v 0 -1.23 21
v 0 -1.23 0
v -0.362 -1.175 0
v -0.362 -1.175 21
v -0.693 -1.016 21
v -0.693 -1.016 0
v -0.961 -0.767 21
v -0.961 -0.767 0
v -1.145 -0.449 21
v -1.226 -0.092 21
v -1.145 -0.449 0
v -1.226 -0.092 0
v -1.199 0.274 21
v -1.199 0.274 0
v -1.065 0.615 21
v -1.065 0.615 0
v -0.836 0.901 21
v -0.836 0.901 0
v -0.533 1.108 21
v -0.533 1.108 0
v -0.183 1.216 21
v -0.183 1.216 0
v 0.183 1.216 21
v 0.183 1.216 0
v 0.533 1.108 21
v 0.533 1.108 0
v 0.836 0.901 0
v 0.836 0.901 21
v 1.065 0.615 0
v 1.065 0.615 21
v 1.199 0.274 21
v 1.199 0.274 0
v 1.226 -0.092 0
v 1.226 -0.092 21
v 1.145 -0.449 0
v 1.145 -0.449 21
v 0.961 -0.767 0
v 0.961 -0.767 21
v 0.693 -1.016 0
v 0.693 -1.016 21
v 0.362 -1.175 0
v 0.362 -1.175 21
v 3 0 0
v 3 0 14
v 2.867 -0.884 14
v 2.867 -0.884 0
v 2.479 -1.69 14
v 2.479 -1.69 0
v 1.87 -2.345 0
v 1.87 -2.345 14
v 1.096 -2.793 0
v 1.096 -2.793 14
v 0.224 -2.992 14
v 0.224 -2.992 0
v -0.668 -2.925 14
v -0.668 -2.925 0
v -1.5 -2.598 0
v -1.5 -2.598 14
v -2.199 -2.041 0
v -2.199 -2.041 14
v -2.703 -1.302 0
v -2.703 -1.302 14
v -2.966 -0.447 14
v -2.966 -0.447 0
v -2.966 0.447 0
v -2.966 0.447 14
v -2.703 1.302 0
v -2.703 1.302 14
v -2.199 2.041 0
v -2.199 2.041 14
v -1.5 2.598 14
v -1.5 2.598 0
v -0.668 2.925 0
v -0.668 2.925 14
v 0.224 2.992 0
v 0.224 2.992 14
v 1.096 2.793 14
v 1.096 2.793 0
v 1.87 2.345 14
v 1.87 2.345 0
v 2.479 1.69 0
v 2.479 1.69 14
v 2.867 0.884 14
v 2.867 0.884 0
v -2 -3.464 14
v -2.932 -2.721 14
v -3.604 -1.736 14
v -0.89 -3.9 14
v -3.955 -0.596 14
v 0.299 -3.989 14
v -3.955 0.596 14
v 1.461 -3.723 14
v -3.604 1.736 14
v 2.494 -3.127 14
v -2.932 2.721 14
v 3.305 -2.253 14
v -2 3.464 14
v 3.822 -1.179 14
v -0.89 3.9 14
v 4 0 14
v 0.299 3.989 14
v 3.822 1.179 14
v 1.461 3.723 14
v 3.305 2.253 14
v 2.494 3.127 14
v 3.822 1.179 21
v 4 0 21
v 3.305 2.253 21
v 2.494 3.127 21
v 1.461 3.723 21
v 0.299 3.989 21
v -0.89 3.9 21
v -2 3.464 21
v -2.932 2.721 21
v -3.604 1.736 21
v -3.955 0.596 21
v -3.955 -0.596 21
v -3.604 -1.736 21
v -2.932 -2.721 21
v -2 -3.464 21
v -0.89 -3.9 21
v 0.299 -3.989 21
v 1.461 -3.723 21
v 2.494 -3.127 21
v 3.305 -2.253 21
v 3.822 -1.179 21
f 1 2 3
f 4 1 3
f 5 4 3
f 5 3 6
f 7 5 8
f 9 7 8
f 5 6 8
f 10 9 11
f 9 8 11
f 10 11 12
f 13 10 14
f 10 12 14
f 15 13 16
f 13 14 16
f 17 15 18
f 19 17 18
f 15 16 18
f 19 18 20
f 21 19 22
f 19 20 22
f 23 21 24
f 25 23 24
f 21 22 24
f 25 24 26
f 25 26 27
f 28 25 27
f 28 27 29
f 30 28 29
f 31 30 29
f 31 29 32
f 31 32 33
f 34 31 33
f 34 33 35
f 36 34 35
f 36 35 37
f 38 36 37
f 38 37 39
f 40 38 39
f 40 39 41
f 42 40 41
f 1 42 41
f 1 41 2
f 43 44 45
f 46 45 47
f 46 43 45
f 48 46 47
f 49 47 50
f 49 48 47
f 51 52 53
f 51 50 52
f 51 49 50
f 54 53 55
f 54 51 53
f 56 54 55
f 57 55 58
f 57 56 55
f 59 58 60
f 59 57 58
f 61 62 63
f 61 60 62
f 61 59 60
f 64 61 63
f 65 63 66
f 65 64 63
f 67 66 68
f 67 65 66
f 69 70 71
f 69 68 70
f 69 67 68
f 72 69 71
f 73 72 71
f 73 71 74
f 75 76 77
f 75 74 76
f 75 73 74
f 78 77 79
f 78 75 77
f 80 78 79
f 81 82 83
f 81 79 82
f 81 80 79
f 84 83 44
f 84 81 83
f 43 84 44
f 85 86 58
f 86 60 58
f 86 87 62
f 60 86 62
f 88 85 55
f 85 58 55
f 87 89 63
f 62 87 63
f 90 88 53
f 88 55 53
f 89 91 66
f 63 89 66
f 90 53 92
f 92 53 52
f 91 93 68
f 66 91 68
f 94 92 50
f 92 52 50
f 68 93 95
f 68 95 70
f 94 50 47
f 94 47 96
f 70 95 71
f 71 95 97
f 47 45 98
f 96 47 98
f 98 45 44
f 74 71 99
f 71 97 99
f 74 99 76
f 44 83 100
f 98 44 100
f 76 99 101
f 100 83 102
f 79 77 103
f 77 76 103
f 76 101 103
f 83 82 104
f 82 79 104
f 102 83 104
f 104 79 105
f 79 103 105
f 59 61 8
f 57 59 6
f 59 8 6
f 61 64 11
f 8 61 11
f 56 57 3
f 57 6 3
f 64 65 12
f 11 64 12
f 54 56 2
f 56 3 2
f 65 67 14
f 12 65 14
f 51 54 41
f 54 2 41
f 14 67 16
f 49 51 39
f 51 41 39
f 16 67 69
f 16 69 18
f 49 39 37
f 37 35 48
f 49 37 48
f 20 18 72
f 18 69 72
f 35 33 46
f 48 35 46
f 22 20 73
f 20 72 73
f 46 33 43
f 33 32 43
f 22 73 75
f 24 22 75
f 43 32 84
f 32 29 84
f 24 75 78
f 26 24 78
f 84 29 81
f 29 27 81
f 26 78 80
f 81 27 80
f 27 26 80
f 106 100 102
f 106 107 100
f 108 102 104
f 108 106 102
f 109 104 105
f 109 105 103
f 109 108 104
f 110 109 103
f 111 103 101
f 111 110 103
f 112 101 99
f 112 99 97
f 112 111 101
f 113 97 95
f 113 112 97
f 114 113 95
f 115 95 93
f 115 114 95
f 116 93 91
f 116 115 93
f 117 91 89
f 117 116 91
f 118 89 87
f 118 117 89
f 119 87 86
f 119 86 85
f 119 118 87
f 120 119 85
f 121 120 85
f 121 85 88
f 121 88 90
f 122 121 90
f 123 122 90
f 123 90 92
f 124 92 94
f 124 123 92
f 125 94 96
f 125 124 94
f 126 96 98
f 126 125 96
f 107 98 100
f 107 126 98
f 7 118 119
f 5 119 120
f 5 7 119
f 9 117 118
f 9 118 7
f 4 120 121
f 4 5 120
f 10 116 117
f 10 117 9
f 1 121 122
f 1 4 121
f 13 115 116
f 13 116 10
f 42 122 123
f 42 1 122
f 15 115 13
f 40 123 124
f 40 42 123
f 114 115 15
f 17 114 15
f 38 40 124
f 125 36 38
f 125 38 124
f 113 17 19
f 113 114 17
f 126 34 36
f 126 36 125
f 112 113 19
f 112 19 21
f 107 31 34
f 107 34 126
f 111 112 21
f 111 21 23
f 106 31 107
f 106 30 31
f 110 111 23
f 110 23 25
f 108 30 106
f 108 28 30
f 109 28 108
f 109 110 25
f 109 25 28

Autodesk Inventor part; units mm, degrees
ref_plane "YZ Plane" through (0, 0, 0) normal (1, 0, 0) x (0, 1, 0)
ref_plane "XZ Plane" through (0, 0, 0) normal (0, 1, 0) x (-1, 0, 0)
ref_plane "XY Plane" through (0, 0, 0) normal (0, 0, 1) x (1, 0, 0)
sketch "Skizze1" plane through (0, 0, 0) normal (0, 0, 1) x (1, 0, 0)
  circle A0 centre (0, 0) radius 3
  dimension "d0" = 6
extrude "Extrusion1" add sketch "Skizze1" along normal blind 21
hole "Bohrung1" at (0, 0, 21) direction (0, 0, -1) diameter 2.459 end through all thread size "M3x0.5" class "6H" standard "ISO Metric profile"
sketch "Skizze2" plane through (0, 0, 21) normal (0, 0, 1) x (1, 0, 0)
  circle A0 centre (0, 0) radius 3 projected
  circle A1 centre (0, 0) radius 4
  dimension "d12" = 8
extrude "Extrusion2" add sketch "Skizze2" against normal blind 7
properties part number "13_0204_043"
